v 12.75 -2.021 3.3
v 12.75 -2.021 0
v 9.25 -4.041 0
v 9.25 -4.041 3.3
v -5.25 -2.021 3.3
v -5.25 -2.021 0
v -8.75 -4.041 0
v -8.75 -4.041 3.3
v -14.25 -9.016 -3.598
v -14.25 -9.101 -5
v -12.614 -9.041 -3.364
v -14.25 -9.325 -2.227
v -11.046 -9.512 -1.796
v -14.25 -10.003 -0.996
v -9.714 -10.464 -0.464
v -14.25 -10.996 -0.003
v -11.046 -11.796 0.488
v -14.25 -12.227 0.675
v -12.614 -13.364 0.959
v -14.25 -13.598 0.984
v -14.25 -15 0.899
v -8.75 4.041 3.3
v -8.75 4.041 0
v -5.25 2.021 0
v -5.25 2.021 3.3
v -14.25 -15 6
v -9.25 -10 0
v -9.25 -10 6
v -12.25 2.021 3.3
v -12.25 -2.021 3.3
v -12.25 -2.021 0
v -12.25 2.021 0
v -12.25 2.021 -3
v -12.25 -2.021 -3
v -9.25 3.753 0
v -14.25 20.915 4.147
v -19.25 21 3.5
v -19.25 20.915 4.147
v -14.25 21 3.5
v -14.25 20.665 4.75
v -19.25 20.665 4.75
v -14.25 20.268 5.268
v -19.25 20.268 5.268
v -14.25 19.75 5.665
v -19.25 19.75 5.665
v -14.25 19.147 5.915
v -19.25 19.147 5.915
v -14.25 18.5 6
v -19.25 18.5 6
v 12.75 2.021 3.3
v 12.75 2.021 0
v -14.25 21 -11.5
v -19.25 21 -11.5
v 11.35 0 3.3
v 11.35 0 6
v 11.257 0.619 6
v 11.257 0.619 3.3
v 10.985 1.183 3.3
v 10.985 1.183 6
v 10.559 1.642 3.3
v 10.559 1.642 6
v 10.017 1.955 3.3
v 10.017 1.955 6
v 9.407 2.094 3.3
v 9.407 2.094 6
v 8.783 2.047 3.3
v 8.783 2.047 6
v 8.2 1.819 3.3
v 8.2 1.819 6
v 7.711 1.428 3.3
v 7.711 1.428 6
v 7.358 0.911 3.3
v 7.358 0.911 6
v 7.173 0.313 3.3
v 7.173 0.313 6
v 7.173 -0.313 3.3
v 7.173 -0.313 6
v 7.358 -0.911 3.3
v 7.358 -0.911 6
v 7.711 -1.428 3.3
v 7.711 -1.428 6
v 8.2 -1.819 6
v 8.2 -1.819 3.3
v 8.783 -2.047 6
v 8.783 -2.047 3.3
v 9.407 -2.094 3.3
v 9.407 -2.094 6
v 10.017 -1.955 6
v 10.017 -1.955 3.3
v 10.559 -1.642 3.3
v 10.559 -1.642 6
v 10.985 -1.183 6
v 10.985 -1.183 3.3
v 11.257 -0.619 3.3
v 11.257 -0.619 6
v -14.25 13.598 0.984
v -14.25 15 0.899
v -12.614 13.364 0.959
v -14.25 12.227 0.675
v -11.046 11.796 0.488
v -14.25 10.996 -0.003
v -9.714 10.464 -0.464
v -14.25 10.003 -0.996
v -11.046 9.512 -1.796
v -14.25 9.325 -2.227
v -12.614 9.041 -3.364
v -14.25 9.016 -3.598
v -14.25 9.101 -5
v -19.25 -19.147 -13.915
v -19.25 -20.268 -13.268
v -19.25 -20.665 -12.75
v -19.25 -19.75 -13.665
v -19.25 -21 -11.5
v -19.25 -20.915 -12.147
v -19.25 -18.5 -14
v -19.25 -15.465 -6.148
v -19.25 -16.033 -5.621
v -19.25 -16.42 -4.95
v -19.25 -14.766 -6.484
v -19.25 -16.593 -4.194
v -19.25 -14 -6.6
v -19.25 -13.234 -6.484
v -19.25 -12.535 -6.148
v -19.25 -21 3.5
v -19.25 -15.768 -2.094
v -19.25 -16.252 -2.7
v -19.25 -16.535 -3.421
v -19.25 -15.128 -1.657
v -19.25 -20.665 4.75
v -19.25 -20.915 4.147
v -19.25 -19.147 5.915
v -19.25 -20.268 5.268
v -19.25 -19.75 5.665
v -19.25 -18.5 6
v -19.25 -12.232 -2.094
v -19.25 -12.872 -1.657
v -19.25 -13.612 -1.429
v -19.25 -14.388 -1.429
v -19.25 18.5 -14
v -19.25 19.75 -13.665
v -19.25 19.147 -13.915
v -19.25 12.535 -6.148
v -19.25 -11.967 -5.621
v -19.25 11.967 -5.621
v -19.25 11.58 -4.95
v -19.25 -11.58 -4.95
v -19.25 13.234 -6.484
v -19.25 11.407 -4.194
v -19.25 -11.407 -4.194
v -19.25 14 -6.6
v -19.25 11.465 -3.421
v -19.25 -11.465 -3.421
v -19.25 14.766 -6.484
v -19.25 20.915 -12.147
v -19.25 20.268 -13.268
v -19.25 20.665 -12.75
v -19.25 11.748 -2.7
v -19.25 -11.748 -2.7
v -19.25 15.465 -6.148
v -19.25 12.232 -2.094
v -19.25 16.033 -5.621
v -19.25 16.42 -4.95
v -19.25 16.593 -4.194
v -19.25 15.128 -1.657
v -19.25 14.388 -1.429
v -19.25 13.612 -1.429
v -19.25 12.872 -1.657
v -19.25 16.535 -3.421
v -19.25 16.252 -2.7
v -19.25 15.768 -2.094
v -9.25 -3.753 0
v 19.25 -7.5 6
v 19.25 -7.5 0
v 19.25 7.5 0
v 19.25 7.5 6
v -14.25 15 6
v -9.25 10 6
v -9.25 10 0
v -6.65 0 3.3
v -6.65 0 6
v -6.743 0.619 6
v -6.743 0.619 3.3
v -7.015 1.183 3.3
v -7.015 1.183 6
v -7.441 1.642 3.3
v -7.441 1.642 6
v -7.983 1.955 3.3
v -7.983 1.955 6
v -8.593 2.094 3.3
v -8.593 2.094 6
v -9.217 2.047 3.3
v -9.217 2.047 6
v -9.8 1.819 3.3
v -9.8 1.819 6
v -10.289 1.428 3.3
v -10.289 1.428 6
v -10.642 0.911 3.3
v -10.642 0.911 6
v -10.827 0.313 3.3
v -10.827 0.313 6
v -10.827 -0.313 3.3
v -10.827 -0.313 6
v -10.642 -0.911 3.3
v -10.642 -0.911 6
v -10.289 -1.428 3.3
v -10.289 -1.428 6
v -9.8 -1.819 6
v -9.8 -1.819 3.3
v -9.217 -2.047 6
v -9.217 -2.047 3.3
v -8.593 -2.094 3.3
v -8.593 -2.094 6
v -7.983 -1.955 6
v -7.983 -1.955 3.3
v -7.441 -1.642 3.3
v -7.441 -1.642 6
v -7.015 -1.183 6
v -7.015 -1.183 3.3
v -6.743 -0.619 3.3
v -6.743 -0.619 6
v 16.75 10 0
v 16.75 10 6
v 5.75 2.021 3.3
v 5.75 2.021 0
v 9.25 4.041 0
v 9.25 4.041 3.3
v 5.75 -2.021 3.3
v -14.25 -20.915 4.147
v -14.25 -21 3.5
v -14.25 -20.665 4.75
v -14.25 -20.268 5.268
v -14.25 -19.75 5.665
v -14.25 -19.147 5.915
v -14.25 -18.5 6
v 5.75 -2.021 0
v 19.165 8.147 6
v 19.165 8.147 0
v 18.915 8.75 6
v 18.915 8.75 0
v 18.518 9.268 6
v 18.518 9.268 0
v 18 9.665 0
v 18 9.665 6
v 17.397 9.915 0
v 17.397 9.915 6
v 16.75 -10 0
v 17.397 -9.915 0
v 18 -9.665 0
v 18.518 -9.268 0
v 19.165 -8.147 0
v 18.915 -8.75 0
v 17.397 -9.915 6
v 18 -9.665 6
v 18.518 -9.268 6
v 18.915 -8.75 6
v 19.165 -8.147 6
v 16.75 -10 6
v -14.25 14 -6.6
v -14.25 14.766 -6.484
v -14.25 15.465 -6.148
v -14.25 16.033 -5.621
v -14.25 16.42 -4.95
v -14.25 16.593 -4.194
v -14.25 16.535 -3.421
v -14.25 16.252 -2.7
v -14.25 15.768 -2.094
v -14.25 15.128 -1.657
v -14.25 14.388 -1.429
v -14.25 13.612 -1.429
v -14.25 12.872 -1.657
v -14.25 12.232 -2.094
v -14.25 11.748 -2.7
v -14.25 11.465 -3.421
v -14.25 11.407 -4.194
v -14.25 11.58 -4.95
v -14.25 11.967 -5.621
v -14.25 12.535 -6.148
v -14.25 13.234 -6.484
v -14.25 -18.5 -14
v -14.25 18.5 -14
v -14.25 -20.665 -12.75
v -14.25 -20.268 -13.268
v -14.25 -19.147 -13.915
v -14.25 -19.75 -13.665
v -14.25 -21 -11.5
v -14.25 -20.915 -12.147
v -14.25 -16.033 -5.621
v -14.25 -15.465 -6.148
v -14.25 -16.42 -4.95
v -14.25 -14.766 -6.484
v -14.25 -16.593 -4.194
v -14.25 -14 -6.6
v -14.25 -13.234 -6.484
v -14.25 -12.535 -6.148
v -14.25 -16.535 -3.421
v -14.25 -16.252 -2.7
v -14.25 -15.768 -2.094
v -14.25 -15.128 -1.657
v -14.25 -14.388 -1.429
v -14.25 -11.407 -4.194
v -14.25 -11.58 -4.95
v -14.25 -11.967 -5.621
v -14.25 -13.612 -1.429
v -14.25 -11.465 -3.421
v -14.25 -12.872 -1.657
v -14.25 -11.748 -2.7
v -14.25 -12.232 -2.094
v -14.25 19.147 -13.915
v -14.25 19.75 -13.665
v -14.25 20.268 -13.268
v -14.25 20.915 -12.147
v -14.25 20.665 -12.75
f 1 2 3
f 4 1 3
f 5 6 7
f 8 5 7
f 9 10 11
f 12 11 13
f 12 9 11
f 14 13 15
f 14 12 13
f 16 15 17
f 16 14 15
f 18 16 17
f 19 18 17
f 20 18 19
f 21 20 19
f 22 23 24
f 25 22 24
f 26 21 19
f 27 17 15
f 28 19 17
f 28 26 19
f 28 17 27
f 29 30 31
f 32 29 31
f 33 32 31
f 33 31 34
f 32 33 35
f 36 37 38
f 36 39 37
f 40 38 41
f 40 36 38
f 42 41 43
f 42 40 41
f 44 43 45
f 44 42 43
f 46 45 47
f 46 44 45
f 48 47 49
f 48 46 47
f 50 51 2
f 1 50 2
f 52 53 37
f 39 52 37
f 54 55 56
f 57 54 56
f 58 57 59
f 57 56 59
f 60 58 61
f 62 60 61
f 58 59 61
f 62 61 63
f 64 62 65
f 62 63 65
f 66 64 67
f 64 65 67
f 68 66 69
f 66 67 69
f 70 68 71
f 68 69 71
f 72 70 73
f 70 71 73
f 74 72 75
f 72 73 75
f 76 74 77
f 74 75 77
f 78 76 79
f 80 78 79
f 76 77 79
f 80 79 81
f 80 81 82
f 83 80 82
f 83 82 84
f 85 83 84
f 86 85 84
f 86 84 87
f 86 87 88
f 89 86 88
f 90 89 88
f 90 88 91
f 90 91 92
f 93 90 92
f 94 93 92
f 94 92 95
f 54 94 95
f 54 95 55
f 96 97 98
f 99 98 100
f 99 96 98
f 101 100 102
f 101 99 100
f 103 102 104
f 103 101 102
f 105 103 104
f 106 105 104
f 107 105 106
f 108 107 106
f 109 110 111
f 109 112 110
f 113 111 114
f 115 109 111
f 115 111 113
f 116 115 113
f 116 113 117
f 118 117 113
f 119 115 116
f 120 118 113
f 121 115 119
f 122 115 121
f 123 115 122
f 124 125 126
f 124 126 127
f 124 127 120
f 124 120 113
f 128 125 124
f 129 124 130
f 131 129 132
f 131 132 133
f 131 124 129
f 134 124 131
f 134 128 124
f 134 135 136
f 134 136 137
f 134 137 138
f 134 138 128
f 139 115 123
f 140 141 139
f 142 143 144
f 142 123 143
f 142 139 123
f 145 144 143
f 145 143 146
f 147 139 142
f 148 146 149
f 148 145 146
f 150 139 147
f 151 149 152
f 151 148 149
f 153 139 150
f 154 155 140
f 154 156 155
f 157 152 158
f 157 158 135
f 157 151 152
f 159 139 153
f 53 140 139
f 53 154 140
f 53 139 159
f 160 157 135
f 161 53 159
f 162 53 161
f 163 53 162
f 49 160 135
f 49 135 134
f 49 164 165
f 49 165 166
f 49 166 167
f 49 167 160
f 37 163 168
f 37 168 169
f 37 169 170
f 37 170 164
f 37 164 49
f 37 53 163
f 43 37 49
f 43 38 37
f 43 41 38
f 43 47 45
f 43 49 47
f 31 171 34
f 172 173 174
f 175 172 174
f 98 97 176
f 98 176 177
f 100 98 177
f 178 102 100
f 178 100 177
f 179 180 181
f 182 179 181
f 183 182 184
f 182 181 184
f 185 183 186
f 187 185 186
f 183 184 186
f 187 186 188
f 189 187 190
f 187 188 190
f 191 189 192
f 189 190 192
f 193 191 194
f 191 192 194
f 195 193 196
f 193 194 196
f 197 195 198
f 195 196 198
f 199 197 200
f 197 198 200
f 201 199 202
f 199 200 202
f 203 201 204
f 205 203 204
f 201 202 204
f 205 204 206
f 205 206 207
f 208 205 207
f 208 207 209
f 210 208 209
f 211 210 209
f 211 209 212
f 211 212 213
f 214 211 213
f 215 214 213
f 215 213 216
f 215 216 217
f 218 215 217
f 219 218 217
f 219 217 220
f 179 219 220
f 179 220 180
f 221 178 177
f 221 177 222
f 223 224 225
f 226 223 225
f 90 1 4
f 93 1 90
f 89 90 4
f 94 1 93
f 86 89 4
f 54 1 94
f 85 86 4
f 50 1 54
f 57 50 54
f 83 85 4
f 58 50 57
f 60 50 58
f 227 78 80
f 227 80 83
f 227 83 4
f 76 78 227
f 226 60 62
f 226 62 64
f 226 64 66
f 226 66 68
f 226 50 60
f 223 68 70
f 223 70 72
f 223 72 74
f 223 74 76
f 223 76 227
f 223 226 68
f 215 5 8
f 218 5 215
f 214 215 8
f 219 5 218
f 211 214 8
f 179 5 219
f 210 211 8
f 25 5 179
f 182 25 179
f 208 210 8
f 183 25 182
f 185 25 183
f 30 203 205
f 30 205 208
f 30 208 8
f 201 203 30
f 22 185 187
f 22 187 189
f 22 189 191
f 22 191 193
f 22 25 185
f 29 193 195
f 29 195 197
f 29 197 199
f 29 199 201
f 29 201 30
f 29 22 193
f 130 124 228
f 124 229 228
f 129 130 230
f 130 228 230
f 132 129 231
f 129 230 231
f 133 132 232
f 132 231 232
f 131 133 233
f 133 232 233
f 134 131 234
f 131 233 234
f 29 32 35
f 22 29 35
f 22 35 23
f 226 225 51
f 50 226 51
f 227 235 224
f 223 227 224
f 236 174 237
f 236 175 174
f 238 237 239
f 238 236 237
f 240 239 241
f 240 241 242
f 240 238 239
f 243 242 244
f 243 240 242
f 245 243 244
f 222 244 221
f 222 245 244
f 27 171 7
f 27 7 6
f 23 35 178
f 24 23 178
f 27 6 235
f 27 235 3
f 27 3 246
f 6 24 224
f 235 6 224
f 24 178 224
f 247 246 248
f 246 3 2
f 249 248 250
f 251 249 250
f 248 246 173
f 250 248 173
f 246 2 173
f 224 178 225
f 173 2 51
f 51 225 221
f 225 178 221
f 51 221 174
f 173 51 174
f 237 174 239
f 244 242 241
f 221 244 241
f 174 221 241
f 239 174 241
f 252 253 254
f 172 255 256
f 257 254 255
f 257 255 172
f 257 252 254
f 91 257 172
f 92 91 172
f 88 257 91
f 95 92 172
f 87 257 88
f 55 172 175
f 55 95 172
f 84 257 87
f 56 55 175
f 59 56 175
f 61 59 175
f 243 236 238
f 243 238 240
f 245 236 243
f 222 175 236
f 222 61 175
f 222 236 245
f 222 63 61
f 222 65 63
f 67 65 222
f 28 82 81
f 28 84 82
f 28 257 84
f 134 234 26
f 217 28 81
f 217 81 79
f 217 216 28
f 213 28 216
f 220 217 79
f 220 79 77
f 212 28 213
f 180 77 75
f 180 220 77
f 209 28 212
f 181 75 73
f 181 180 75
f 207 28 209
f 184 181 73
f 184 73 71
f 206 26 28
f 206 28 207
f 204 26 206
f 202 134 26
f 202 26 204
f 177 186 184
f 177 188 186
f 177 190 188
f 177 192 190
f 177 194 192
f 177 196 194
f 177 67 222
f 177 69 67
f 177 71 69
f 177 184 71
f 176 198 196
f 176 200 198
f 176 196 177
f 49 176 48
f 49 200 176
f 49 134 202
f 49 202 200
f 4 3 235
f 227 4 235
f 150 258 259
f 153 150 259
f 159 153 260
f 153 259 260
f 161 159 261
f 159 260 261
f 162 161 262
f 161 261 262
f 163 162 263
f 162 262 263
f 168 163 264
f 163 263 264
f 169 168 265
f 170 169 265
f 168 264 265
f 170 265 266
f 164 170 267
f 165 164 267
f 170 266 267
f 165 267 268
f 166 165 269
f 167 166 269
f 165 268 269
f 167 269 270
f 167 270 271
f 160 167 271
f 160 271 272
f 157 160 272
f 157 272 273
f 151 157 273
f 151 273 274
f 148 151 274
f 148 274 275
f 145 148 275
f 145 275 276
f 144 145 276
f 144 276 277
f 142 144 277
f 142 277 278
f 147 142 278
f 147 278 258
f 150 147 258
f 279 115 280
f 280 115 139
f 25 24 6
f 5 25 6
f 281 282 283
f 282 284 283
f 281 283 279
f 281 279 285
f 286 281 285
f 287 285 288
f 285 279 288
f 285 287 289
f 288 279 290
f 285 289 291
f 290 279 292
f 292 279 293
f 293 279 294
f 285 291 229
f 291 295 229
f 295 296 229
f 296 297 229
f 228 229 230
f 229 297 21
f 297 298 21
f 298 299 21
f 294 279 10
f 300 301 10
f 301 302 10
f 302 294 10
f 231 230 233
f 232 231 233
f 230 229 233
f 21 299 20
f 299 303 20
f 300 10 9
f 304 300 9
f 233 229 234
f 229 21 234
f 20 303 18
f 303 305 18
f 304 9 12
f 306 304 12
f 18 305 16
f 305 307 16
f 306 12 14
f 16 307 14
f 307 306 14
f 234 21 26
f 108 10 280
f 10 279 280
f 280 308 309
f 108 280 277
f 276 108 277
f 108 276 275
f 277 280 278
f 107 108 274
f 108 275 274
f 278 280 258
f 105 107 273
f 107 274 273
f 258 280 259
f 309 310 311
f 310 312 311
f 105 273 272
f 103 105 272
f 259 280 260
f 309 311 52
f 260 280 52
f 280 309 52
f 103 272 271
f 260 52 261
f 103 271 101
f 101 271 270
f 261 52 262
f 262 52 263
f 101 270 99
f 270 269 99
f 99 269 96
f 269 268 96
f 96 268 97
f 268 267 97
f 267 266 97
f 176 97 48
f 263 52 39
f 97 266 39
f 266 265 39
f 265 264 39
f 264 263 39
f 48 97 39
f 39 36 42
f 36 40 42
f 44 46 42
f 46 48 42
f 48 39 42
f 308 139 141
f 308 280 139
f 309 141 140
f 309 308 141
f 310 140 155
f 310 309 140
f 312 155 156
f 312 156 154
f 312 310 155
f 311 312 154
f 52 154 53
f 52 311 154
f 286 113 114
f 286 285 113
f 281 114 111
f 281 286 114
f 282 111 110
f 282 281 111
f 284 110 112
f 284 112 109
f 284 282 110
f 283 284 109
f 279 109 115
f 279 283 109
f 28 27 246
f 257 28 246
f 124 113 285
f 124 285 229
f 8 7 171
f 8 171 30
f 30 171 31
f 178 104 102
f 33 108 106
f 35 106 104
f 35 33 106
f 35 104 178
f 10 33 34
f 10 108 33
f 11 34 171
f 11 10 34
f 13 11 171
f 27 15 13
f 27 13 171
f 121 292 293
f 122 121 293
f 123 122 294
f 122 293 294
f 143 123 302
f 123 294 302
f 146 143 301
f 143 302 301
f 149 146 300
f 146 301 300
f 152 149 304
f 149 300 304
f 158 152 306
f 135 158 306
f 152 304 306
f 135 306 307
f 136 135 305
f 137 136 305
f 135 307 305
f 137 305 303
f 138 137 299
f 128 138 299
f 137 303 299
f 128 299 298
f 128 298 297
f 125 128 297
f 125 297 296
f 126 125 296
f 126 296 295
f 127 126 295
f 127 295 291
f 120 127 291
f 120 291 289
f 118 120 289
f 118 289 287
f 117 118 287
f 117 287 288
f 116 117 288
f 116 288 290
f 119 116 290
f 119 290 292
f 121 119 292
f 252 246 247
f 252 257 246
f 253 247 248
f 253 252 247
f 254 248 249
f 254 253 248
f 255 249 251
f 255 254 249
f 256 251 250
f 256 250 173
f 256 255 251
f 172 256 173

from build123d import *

# Parameters (mm, degrees)
SKETCH_1_W          = 38.5
SKETCH_1_H          = 20
EXTRUDE_1_DEPTH     = 6
SKETCH_2_W          = 20
SKETCH_2_H          = 42
EXTRUDE_2_DEPTH     = 5
SKETCH_3_R          = 2.1
CUT_EXTRUDE_1_DEPTH = 35.807506374
CUT_EXTRUDE_2_DEPTH = 3.3
SKETCH_5_R          = 2.6
CUT_EXTRUDE_3_DEPTH = 42.943414263
CHAMFER_2_SIZE      = 5
SKETCH_6_R          = 5
CUT_EXTRUDE_4_DEPTH = 42.943414263
FILLET_1_R          = 2.5


with BuildPart() as part:
    # Эскиз1 → Бобышка-Вытянуть1 (new body)
    with BuildSketch(Plane.XY):
        Rectangle(SKETCH_1_W, SKETCH_1_H)
    extrude(amount=EXTRUDE_1_DEPTH)

    # Эскиз2 → Бобышка-Вытянуть2 (add)
    with BuildSketch(Plane.ZY.offset(19.25)):
        with Locations((-4, 0)):
            Rectangle(SKETCH_2_W, SKETCH_2_H)
    extrude(amount=-EXTRUDE_2_DEPTH)

    # Эскиз3 → Вырез-Вытянуть1 (cut, through all)
    with BuildSketch(Plane.XY.offset(6)):
        with Locations((9.25, 0)):
            Circle(SKETCH_3_R)
        with Locations((-8.75, 0)):
            Circle(SKETCH_3_R)
    extrude(amount=-CUT_EXTRUDE_1_DEPTH, mode=Mode.SUBTRACT)

    # Эскиз4 → Вырез-Вытянуть2 (cut)
    with BuildSketch(Plane(origin=(0, 0, 0), x_dir=(-1, 0, 0), z_dir=(0, 0, -1))):
        Polygon((8.75, 4.041451884), (5.25, 2.020725942), (5.25, -2.020725942), (8.75, -4.041451884), (12.25, -2.020725942), (12.25, 2.020725942), align=None)
        Polygon((-9.25, 4.041451884), (-12.75, 2.020725942), (-12.75, -2.020725942), (-9.25, -4.041451884), (-5.75, -2.020725942), (-5.75, 2.020725942), align=None)
    extrude(amount=-CUT_EXTRUDE_2_DEPTH, mode=Mode.SUBTRACT)

    # Эскиз5 → Вырез-Вытянуть3 (cut, through all)
    with BuildSketch(Plane(origin=(-14.25, 0, 0), x_dir=(0, 0, -1), z_dir=(1, 0, 0))):
        with Locations((4, 14)):
            Circle(SKETCH_5_R)
        with Locations((4, -14)):
            Circle(SKETCH_5_R)
    extrude(amount=-CUT_EXTRUDE_3_DEPTH, mode=Mode.SUBTRACT)

    # Фаска2
    # the kernel refuses this chamfer: 5 mm, written as the material it adds along each edge
    with BuildSketch(Plane(origin=(-14.25, 10, -12.85841494), x_dir=(0, 1, 0), z_dir=(0, 0, 1))) as chamfer_2_piece_1_section:
        Polygon((CHAMFER_2_SIZE, 0), (0, -CHAMFER_2_SIZE), (0, 0), align=None)
    chamfer_2_piece_1 = extrude(amount=18.85841494, mode=Mode.PRIVATE)
    chamfer_2_piece_1 = chamfer_2_piece_1 - Plane(origin=(-14.25, 14, -4), x_dir=(0, 0, -1), z_dir=(1, 0, 0)) * Cylinder(2.6, 58, mode=Mode.PRIVATE)
    chamfer_2_piece_1 = split(chamfer_2_piece_1, bisect_by=Plane(origin=(-18.17920747, 10, -8.92920747), z_dir=(-0.7071067811865476, 0, 0.7071067811865476)), keep=Keep.TOP, mode=Mode.PRIVATE)
    add(chamfer_2_piece_1)
    with BuildSketch(Plane(origin=(-14.25, -10, 6), x_dir=(0, -1, 0), z_dir=(0, 0, -1))) as chamfer_2_piece_2_section:
        Polygon((CHAMFER_2_SIZE, 0), (0, -CHAMFER_2_SIZE), (0, 0), align=None)
    chamfer_2_piece_2 = extrude(amount=18.85841494, mode=Mode.PRIVATE)
    chamfer_2_piece_2 = chamfer_2_piece_2 - Plane(origin=(-14.25, -14, -4), x_dir=(0, 0, -1), z_dir=(1, 0, 0)) * Cylinder(2.6, 58, mode=Mode.PRIVATE)
    chamfer_2_piece_2 = split(chamfer_2_piece_2, bisect_by=Plane(origin=(-8.75, -10, 0.5), z_dir=(-0.7071067811865476, 0, 0.7071067811865476)), keep=Keep.TOP, mode=Mode.PRIVATE)
    add(chamfer_2_piece_2)
    with BuildSketch(Plane(origin=(-14.25, -22.85841494, 0), x_dir=(0, 0, -1), z_dir=(0, 1, 0))) as chamfer_2_piece_3_section:
        Polygon((CHAMFER_2_SIZE, 0), (0, -CHAMFER_2_SIZE), (0, 0), align=None)
    chamfer_2_piece_3 = extrude(amount=45.71682988, mode=Mode.PRIVATE)
    chamfer_2_piece_3 = chamfer_2_piece_3 - Plane(origin=(-14.25, -14, -4), x_dir=(0, 0, -1), z_dir=(1, 0, 0)) * Cylinder(2.6, 112, mode=Mode.PRIVATE)
    chamfer_2_piece_3 = split(chamfer_2_piece_3, bisect_by=Plane(origin=(-4.727015986, -6.364122788, 0), z_dir=(-0.5, -0.8660254037844387, 0)), keep=Keep.TOP, mode=Mode.PRIVATE)
    chamfer_2_piece_3 = split(chamfer_2_piece_3, bisect_by=Plane(origin=(-18.17920747, -18.92920747, 0), z_dir=(-0.7071067811865478, 0.7071067811865472, 0)), keep=Keep.TOP, mode=Mode.PRIVATE)
    add(chamfer_2_piece_3)
    with BuildSketch(Plane(origin=(-14.25, -22.85841494, 0), x_dir=(0, 0, -1), z_dir=(0, 1, 0))) as chamfer_2_piece_4_section:
        Polygon((CHAMFER_2_SIZE, 0), (0, -CHAMFER_2_SIZE), (0, 0), align=None)
    chamfer_2_piece_4 = extrude(amount=45.71682988, mode=Mode.PRIVATE)
    chamfer_2_piece_4 = chamfer_2_piece_4 - Plane(origin=(-14.25, 14, -4), x_dir=(0, 0, -1), z_dir=(1, 0, 0)) * Cylinder(2.6, 112, mode=Mode.PRIVATE)
    chamfer_2_piece_4 = split(chamfer_2_piece_4, bisect_by=Plane(origin=(-4.727015986, -6.364122788, 0), z_dir=(0.5, 0.8660254037844387, 0)), keep=Keep.TOP, mode=Mode.PRIVATE)
    chamfer_2_piece_4 = split(chamfer_2_piece_4, bisect_by=Plane(origin=(-12.25, -22.85841494, 0), z_dir=(-1, 0, 0)), keep=Keep.TOP, mode=Mode.PRIVATE)
    chamfer_2_piece_4 = split(chamfer_2_piece_4, bisect_by=Plane(origin=(4.67920747, -3.92920747, 0), z_dir=(-0.7071067811865476, -0.7071067811865476, 0)), keep=Keep.TOP, mode=Mode.PRIVATE)
    add(chamfer_2_piece_4)
    with BuildSketch(Plane(origin=(-14.25, -22.85841494, 0), x_dir=(0, 0, -1), z_dir=(0, 1, 0))) as chamfer_2_piece_5_section:
        Polygon((CHAMFER_2_SIZE, 0), (0, -CHAMFER_2_SIZE), (0, 0), align=None)
    chamfer_2_piece_5 = extrude(amount=45.71682988, mode=Mode.PRIVATE)
    chamfer_2_piece_5 = chamfer_2_piece_5 - Plane(origin=(-14.25, 14, -4), x_dir=(0, 0, -1), z_dir=(1, 0, 0)) * Cylinder(2.6, 112, mode=Mode.PRIVATE)
    chamfer_2_piece_5 = split(chamfer_2_piece_5, bisect_by=Plane(origin=(-24.522984014, -5.065084682, 0), z_dir=(-0.4999999999999998, 0.8660254037844388, 0)), keep=Keep.TOP, mode=Mode.PRIVATE)
    chamfer_2_piece_5 = split(chamfer_2_piece_5, bisect_by=Plane(origin=(4.67920747, -3.92920747, 0), z_dir=(-0.7071067811865476, -0.7071067811865476, 0)), keep=Keep.TOP, mode=Mode.PRIVATE)
    add(chamfer_2_piece_5)

    # Эскиз6 → Вырез-Вытянуть4 (cut, through all)
    with BuildSketch(Plane(origin=(-14.25, 0, 0), x_dir=(0, 0, -1), z_dir=(1, 0, 0))):
        with Locations((4, -14)):
            Circle(SKETCH_6_R)
        with Locations((4, 14)):
            Circle(SKETCH_6_R)
    extrude(amount=CUT_EXTRUDE_4_DEPTH, mode=Mode.SUBTRACT)

    # Скругление1
    fillet_1_edges = [part.edges().sort_by_distance(p)[0] for p in [
        (-16.75, 21, 6),
        (-16.75, -21, 6),
        (-16.75, -21, -14),
        (-16.75, 21, -14),
        (19.25, 10, 3),
        (19.25, -10, 3),
    ]]
    fillet(fillet_1_edges, radius=FILLET_1_R)


solid = part.part
